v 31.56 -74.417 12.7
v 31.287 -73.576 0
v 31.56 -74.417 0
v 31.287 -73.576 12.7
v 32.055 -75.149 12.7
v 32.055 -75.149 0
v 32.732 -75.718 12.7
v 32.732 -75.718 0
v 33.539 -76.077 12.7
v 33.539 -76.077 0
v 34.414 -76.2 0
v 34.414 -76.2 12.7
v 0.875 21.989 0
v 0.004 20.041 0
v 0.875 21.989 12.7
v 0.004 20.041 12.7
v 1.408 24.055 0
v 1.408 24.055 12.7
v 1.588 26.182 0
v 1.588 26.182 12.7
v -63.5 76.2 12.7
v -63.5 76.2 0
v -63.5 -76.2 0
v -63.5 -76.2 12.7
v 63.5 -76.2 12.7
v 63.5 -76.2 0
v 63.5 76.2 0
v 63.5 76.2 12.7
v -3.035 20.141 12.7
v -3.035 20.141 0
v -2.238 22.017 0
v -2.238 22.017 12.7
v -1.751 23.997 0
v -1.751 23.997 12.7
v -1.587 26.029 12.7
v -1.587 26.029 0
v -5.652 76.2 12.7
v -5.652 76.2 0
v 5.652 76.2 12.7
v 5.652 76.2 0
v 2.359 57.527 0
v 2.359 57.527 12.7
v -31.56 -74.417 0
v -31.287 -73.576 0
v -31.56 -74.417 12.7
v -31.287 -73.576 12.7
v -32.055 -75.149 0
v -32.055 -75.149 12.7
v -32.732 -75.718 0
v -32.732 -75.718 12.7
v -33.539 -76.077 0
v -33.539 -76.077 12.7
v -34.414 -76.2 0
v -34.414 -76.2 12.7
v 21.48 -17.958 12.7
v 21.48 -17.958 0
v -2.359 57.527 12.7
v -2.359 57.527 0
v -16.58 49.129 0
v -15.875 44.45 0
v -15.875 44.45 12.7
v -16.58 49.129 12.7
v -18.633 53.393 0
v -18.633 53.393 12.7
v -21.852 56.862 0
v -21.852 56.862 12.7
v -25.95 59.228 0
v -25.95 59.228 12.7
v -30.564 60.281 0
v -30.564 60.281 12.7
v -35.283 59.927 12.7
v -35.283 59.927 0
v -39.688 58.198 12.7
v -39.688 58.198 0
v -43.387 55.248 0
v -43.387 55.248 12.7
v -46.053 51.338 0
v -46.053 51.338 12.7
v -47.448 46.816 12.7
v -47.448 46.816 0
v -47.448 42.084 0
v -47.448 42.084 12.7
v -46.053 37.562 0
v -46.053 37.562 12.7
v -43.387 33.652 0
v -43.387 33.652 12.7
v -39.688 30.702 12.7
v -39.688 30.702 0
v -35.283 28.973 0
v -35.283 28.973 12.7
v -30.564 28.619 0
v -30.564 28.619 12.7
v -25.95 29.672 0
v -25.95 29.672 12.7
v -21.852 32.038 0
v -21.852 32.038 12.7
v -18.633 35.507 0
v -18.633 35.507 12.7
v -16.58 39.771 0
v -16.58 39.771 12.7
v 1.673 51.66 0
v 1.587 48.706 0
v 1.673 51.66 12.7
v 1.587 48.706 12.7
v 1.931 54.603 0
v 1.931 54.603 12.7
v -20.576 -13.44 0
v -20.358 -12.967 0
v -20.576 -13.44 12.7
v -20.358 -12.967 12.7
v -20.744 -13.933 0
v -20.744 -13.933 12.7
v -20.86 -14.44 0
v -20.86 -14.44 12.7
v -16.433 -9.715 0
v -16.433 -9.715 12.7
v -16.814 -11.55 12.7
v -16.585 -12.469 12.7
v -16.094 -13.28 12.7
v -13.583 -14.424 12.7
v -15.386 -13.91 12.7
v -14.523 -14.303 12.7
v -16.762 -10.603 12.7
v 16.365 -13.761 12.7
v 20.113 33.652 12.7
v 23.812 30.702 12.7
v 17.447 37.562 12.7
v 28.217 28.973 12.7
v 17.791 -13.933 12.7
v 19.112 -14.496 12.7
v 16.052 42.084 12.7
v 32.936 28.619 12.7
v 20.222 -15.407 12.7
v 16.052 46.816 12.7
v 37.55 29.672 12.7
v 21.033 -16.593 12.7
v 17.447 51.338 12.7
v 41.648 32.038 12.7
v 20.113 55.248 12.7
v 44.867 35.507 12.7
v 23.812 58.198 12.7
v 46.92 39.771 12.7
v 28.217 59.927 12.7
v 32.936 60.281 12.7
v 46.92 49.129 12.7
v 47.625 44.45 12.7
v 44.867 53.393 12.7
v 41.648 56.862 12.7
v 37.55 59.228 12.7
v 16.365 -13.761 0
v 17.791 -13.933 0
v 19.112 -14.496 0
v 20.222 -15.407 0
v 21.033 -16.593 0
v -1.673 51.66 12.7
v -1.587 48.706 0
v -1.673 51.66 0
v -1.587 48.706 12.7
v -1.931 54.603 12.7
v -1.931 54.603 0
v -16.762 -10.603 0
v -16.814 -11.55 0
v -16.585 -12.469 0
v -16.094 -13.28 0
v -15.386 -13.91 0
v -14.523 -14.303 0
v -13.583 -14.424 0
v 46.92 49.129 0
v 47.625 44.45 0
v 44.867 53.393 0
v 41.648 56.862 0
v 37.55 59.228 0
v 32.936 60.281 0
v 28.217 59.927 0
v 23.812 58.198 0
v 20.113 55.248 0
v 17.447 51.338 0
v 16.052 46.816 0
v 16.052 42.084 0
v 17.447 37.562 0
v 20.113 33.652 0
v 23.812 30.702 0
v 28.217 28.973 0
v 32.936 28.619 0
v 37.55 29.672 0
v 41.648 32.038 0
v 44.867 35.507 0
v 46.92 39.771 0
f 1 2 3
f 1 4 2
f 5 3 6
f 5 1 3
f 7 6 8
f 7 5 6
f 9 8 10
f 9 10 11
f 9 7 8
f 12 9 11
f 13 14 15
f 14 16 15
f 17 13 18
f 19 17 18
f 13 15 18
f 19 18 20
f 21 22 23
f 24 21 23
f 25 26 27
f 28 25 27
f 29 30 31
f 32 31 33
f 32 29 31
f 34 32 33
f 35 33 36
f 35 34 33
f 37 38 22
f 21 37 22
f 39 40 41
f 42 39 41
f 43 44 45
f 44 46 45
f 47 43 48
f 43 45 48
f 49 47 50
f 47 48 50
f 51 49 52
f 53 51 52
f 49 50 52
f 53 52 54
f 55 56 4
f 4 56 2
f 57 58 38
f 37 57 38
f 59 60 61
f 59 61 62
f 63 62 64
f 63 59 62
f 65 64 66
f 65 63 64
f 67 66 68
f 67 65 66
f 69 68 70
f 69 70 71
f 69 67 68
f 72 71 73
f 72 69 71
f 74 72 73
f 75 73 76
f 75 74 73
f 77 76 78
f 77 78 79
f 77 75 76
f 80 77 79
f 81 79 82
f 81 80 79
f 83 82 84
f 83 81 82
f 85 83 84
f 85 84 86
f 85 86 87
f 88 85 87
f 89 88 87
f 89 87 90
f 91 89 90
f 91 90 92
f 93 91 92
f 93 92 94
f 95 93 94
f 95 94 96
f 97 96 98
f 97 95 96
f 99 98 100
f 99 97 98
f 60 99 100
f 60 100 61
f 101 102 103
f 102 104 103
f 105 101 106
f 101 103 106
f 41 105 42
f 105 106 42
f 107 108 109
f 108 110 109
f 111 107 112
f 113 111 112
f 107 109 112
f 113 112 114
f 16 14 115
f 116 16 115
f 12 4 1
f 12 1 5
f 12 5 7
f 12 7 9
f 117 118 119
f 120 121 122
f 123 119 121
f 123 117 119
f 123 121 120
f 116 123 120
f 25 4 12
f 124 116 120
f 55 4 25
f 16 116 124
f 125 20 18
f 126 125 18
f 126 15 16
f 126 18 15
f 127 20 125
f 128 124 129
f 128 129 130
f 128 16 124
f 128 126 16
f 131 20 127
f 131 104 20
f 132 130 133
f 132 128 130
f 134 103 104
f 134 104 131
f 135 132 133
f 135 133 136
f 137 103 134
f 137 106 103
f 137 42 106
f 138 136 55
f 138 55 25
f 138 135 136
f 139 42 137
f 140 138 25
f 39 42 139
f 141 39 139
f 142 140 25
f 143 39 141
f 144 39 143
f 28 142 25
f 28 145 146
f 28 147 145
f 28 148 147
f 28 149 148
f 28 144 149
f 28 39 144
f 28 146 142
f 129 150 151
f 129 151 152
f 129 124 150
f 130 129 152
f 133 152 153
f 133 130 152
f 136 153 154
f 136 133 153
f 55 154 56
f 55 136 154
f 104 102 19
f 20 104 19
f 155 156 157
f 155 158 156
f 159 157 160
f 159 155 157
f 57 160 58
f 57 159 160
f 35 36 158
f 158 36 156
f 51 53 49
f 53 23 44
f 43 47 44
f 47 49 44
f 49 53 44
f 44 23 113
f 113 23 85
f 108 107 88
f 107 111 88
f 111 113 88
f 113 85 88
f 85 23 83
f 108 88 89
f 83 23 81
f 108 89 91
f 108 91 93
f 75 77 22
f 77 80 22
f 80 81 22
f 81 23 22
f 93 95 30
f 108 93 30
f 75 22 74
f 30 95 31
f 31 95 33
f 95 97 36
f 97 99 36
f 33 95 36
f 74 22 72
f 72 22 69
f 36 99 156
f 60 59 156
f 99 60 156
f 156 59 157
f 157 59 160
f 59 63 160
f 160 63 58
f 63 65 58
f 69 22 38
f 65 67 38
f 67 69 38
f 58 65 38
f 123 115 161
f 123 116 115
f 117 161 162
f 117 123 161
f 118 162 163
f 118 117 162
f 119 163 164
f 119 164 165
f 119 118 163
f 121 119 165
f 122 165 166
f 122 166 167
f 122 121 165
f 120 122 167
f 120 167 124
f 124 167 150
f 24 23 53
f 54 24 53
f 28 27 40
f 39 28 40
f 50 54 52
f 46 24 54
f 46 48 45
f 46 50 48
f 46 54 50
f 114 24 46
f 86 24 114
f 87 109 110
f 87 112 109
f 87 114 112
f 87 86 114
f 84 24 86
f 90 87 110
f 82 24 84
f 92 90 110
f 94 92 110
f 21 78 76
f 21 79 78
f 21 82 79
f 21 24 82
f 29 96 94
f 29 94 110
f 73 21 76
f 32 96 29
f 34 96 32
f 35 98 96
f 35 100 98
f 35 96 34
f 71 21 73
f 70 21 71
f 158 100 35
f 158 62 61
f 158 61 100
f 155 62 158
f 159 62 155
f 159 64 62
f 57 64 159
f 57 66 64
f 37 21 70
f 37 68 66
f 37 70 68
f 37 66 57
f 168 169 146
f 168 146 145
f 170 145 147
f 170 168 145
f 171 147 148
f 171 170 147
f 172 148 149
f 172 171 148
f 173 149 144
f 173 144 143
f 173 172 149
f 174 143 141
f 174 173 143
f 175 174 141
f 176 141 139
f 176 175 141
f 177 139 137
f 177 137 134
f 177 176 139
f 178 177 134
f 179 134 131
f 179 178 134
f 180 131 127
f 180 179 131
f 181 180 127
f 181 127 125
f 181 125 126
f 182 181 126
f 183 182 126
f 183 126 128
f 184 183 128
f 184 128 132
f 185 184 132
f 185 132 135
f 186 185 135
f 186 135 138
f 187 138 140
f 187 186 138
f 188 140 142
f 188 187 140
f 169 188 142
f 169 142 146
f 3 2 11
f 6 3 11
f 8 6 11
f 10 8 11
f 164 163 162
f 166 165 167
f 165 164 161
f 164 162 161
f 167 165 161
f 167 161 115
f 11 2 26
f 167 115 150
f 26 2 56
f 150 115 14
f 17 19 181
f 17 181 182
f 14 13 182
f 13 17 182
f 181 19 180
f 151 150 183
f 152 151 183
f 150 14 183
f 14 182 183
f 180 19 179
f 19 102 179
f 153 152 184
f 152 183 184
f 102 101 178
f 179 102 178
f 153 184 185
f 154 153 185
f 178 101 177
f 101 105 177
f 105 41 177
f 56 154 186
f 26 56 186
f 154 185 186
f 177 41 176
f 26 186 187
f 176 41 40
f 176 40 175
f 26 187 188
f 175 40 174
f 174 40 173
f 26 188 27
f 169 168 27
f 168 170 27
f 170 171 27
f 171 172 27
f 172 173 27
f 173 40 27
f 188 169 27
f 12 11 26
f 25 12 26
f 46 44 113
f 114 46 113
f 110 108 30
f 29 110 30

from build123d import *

# Parameters (mm, degrees)
F0_R     = 15.875
F1_DEPTH = 12.7
F2_R     = 12.7
F3_R     = 50.8
F4_R     = 3.175
F5_R     = 5.08
F6_R     = 3.175


with BuildPart() as f1:
    # F0 (on Top) → F1 (new body)
    with BuildSketch(Plane.XY):
        Polygon((31.75, -76.2), (63.5, -76.2), (63.5, 76.2), (5.651776, 76.2), (1.5875, 53.150346), (1.5875, 22.907235), (-19.10167, -14.546104), (20.723341, -13.664708), align=None)
        with Locations((31.75, 44.45)):
            Circle(F0_R, mode=Mode.SUBTRACT)
        Polygon((-63.5, -76.2), (-31.75, -76.2), (-20.723341, -13.664708), (-1.5875, 22.907235), (-1.5875, 53.150346), (-5.651776, 76.2), (-63.5, 76.2), align=None)
        with Locations((-31.75, 44.45)):
            Circle(F0_R, mode=Mode.SUBTRACT)
    extrude(amount=F1_DEPTH)

    # F2
    f2_edges = [f1.edges().sort_by_distance(p)[0] for p in [
        (1.5875, 22.907235, 6.35),
        (-1.5875, 22.907235, 6.35),
    ]]
    fillet(f2_edges, radius=F2_R)

    # F3
    f3_edges = [f1.edges().sort_by_distance(p)[0] for p in [
        (1.5875, 53.150346, 6.35),
        (-1.5875, 53.150346, 6.35),
    ]]
    fillet(f3_edges, radius=F3_R)

    # F4
    f4_edges = [f1.edges().sort_by_distance(p)[0] for p in [
        (-19.10167, -14.546104, 6.35),
    ]]
    fillet(f4_edges, radius=F4_R)

    # F5
    f5_edges = [f1.edges().sort_by_distance(p)[0] for p in [
        (20.723341, -13.664708, 6.35),
        (-20.723341, -13.664708, 6.35),
    ]]
    fillet(f5_edges, radius=F5_R)

    # F6
    f6_edges = [f1.edges().sort_by_distance(p)[0] for p in [
        (-31.75, -76.2, 6.35),
        (31.75, -76.2, 6.35),
    ]]
    fillet(f6_edges, radius=F6_R)


solid = f1.part
